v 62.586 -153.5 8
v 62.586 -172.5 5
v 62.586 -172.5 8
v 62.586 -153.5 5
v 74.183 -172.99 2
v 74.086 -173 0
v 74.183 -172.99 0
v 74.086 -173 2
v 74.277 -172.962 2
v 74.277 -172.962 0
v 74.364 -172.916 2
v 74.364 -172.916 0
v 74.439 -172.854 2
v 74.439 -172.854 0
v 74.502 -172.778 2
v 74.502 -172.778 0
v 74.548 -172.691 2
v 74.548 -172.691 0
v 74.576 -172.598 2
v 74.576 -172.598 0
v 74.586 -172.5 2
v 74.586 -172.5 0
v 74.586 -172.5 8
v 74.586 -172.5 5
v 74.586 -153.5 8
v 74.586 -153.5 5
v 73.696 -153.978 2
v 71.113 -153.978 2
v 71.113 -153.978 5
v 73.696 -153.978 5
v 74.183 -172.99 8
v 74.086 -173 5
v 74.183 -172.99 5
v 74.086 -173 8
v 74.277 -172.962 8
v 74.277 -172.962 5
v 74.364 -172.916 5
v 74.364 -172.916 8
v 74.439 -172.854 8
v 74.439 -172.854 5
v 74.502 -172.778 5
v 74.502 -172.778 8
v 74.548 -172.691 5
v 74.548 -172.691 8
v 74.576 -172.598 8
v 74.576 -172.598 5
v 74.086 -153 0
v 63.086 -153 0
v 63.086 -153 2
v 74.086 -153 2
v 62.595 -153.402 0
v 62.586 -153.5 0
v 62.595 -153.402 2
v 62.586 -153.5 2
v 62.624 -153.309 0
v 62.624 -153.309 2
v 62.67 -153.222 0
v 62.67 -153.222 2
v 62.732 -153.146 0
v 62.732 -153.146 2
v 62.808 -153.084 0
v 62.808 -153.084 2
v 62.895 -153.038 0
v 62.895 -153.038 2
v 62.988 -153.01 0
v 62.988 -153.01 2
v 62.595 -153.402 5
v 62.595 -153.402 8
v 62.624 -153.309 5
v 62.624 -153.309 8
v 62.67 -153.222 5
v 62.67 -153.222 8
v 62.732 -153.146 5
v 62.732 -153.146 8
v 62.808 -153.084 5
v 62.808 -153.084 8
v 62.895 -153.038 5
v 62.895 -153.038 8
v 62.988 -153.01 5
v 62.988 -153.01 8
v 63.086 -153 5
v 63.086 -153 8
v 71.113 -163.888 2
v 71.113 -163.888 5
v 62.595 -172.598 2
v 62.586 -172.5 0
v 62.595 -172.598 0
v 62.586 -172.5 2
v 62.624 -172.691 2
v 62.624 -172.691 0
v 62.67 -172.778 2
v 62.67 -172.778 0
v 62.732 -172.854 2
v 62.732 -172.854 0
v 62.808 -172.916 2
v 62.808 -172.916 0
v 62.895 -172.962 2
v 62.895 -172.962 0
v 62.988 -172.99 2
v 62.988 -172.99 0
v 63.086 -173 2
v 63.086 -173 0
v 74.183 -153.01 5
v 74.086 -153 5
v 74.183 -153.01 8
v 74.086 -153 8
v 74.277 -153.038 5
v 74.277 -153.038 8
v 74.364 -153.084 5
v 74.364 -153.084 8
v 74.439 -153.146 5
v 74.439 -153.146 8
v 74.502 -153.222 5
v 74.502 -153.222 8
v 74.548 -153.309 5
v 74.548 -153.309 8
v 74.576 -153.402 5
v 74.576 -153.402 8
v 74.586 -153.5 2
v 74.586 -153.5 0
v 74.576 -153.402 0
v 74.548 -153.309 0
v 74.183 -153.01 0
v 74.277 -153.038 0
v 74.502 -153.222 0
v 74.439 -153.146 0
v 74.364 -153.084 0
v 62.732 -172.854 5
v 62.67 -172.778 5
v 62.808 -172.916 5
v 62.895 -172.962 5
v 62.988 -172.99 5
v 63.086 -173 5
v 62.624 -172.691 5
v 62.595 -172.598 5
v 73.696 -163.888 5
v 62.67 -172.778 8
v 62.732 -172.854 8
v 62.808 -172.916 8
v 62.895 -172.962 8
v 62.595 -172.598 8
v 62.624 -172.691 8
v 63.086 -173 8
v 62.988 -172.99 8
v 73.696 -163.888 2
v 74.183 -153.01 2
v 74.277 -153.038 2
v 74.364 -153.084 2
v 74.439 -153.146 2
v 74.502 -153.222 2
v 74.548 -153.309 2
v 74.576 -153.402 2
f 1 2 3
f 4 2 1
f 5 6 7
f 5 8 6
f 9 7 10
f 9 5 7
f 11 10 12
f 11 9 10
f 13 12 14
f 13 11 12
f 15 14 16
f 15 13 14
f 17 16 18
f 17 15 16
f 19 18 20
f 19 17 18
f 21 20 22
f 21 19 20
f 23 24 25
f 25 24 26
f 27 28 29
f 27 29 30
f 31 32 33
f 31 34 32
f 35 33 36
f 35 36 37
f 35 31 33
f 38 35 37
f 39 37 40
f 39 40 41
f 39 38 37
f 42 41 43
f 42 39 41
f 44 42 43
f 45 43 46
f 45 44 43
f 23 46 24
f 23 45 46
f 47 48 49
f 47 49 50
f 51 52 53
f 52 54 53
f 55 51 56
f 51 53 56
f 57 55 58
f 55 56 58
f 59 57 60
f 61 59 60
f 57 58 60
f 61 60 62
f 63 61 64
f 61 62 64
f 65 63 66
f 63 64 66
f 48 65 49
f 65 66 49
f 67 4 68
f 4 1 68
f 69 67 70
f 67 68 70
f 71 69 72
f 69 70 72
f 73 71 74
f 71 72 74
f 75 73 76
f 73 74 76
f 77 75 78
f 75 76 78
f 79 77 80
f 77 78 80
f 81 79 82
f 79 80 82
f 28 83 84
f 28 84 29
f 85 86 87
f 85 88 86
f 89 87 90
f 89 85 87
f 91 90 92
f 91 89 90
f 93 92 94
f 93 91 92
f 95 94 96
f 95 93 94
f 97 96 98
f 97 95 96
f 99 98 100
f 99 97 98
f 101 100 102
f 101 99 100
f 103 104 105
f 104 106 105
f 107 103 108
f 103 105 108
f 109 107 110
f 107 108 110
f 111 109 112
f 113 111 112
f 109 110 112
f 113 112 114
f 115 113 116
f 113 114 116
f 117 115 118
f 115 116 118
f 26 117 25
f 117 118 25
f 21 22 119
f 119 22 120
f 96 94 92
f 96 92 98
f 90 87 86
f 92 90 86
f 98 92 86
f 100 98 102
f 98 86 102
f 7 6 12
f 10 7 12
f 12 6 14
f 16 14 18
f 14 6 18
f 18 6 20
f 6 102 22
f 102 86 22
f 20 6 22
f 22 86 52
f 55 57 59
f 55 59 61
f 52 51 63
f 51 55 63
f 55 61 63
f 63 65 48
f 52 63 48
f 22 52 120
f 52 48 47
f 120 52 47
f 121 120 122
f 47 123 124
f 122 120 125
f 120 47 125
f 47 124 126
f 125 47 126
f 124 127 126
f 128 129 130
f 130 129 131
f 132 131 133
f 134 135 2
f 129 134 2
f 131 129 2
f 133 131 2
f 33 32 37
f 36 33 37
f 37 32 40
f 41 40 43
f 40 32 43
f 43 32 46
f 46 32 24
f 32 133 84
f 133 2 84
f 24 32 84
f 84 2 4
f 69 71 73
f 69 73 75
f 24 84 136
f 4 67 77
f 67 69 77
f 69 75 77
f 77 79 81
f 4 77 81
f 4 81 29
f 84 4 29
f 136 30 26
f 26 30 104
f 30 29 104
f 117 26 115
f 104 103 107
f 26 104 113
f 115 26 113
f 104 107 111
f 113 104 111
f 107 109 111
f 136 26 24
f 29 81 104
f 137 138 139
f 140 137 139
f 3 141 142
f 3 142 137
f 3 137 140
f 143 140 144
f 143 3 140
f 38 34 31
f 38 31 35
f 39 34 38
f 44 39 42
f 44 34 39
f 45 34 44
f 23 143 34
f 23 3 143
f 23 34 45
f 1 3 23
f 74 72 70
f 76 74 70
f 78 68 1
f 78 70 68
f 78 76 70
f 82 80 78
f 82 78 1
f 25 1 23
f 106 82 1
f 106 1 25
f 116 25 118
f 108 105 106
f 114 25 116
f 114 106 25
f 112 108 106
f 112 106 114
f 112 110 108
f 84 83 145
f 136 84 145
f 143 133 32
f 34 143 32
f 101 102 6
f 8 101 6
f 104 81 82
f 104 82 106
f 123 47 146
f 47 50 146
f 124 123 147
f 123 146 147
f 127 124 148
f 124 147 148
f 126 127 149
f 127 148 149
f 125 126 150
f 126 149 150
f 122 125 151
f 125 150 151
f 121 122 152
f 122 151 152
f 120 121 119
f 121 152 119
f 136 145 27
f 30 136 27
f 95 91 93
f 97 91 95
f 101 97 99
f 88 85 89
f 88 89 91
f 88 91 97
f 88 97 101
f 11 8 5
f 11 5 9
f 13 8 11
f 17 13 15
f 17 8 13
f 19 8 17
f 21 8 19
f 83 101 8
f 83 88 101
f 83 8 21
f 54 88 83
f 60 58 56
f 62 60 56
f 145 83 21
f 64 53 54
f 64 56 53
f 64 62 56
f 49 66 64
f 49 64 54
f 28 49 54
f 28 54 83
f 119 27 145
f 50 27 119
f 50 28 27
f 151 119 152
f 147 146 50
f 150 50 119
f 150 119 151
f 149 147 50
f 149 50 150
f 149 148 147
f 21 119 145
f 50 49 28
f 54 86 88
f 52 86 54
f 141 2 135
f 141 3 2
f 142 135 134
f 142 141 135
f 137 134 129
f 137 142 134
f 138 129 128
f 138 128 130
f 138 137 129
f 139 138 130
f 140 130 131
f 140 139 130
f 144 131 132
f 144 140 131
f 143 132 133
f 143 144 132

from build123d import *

# Parameters (mm, degrees)
SKETCH1_W           = 12
SKETCH1_H           = 20
BOSS_EXTRUDE1_DEPTH = 2
SKETCH2_W           = 2.583613584
SKETCH2_H           = 9.909750732
BOSS_EXTRUDE2_DEPTH = 3
SKETCH3_W           = 12
SKETCH3_H           = 20
BOSS_EXTRUDE3_DEPTH = 3
FILLET1_R           = 0.5


with BuildPart() as part:
    # Sketch1 → Boss-Extrude1 (new body)
    with BuildSketch(Plane.XY):
        with Locations((68.585871194, -163)):
            Rectangle(SKETCH1_W, SKETCH1_H)
    extrude(amount=BOSS_EXTRUDE1_DEPTH)

    # Sketch2 → Boss-Extrude2 (add)
    with BuildSketch(Plane.XY.offset(2)):
        with Locations((72.404631484, -158.933321579)):
            Rectangle(SKETCH2_W, SKETCH2_H)
    extrude(amount=BOSS_EXTRUDE2_DEPTH)

    # Sketch3 → Boss-Extrude3 (add)
    with BuildSketch(Plane.XY.offset(5)):
        with Locations((68.585871194, -163)):
            Rectangle(SKETCH3_W, SKETCH3_H)
    extrude(amount=BOSS_EXTRUDE3_DEPTH)

    # Fillet1
    fillet1_edges = [part.edges().sort_by_distance(p)[0] for p in [
        (62.585871194, -173, 6.5),
        (74.585871194, -173, 6.5),
        (74.585871194, -153, 6.5),
        (62.585871194, -153, 6.5),
        (62.585871194, -153, 1),
        (74.585871194, -153, 1),
        (74.585871194, -173, 1),
        (62.585871194, -173, 1),
    ]]
    fillet(fillet1_edges, radius=FILLET1_R)


solid = part.part
